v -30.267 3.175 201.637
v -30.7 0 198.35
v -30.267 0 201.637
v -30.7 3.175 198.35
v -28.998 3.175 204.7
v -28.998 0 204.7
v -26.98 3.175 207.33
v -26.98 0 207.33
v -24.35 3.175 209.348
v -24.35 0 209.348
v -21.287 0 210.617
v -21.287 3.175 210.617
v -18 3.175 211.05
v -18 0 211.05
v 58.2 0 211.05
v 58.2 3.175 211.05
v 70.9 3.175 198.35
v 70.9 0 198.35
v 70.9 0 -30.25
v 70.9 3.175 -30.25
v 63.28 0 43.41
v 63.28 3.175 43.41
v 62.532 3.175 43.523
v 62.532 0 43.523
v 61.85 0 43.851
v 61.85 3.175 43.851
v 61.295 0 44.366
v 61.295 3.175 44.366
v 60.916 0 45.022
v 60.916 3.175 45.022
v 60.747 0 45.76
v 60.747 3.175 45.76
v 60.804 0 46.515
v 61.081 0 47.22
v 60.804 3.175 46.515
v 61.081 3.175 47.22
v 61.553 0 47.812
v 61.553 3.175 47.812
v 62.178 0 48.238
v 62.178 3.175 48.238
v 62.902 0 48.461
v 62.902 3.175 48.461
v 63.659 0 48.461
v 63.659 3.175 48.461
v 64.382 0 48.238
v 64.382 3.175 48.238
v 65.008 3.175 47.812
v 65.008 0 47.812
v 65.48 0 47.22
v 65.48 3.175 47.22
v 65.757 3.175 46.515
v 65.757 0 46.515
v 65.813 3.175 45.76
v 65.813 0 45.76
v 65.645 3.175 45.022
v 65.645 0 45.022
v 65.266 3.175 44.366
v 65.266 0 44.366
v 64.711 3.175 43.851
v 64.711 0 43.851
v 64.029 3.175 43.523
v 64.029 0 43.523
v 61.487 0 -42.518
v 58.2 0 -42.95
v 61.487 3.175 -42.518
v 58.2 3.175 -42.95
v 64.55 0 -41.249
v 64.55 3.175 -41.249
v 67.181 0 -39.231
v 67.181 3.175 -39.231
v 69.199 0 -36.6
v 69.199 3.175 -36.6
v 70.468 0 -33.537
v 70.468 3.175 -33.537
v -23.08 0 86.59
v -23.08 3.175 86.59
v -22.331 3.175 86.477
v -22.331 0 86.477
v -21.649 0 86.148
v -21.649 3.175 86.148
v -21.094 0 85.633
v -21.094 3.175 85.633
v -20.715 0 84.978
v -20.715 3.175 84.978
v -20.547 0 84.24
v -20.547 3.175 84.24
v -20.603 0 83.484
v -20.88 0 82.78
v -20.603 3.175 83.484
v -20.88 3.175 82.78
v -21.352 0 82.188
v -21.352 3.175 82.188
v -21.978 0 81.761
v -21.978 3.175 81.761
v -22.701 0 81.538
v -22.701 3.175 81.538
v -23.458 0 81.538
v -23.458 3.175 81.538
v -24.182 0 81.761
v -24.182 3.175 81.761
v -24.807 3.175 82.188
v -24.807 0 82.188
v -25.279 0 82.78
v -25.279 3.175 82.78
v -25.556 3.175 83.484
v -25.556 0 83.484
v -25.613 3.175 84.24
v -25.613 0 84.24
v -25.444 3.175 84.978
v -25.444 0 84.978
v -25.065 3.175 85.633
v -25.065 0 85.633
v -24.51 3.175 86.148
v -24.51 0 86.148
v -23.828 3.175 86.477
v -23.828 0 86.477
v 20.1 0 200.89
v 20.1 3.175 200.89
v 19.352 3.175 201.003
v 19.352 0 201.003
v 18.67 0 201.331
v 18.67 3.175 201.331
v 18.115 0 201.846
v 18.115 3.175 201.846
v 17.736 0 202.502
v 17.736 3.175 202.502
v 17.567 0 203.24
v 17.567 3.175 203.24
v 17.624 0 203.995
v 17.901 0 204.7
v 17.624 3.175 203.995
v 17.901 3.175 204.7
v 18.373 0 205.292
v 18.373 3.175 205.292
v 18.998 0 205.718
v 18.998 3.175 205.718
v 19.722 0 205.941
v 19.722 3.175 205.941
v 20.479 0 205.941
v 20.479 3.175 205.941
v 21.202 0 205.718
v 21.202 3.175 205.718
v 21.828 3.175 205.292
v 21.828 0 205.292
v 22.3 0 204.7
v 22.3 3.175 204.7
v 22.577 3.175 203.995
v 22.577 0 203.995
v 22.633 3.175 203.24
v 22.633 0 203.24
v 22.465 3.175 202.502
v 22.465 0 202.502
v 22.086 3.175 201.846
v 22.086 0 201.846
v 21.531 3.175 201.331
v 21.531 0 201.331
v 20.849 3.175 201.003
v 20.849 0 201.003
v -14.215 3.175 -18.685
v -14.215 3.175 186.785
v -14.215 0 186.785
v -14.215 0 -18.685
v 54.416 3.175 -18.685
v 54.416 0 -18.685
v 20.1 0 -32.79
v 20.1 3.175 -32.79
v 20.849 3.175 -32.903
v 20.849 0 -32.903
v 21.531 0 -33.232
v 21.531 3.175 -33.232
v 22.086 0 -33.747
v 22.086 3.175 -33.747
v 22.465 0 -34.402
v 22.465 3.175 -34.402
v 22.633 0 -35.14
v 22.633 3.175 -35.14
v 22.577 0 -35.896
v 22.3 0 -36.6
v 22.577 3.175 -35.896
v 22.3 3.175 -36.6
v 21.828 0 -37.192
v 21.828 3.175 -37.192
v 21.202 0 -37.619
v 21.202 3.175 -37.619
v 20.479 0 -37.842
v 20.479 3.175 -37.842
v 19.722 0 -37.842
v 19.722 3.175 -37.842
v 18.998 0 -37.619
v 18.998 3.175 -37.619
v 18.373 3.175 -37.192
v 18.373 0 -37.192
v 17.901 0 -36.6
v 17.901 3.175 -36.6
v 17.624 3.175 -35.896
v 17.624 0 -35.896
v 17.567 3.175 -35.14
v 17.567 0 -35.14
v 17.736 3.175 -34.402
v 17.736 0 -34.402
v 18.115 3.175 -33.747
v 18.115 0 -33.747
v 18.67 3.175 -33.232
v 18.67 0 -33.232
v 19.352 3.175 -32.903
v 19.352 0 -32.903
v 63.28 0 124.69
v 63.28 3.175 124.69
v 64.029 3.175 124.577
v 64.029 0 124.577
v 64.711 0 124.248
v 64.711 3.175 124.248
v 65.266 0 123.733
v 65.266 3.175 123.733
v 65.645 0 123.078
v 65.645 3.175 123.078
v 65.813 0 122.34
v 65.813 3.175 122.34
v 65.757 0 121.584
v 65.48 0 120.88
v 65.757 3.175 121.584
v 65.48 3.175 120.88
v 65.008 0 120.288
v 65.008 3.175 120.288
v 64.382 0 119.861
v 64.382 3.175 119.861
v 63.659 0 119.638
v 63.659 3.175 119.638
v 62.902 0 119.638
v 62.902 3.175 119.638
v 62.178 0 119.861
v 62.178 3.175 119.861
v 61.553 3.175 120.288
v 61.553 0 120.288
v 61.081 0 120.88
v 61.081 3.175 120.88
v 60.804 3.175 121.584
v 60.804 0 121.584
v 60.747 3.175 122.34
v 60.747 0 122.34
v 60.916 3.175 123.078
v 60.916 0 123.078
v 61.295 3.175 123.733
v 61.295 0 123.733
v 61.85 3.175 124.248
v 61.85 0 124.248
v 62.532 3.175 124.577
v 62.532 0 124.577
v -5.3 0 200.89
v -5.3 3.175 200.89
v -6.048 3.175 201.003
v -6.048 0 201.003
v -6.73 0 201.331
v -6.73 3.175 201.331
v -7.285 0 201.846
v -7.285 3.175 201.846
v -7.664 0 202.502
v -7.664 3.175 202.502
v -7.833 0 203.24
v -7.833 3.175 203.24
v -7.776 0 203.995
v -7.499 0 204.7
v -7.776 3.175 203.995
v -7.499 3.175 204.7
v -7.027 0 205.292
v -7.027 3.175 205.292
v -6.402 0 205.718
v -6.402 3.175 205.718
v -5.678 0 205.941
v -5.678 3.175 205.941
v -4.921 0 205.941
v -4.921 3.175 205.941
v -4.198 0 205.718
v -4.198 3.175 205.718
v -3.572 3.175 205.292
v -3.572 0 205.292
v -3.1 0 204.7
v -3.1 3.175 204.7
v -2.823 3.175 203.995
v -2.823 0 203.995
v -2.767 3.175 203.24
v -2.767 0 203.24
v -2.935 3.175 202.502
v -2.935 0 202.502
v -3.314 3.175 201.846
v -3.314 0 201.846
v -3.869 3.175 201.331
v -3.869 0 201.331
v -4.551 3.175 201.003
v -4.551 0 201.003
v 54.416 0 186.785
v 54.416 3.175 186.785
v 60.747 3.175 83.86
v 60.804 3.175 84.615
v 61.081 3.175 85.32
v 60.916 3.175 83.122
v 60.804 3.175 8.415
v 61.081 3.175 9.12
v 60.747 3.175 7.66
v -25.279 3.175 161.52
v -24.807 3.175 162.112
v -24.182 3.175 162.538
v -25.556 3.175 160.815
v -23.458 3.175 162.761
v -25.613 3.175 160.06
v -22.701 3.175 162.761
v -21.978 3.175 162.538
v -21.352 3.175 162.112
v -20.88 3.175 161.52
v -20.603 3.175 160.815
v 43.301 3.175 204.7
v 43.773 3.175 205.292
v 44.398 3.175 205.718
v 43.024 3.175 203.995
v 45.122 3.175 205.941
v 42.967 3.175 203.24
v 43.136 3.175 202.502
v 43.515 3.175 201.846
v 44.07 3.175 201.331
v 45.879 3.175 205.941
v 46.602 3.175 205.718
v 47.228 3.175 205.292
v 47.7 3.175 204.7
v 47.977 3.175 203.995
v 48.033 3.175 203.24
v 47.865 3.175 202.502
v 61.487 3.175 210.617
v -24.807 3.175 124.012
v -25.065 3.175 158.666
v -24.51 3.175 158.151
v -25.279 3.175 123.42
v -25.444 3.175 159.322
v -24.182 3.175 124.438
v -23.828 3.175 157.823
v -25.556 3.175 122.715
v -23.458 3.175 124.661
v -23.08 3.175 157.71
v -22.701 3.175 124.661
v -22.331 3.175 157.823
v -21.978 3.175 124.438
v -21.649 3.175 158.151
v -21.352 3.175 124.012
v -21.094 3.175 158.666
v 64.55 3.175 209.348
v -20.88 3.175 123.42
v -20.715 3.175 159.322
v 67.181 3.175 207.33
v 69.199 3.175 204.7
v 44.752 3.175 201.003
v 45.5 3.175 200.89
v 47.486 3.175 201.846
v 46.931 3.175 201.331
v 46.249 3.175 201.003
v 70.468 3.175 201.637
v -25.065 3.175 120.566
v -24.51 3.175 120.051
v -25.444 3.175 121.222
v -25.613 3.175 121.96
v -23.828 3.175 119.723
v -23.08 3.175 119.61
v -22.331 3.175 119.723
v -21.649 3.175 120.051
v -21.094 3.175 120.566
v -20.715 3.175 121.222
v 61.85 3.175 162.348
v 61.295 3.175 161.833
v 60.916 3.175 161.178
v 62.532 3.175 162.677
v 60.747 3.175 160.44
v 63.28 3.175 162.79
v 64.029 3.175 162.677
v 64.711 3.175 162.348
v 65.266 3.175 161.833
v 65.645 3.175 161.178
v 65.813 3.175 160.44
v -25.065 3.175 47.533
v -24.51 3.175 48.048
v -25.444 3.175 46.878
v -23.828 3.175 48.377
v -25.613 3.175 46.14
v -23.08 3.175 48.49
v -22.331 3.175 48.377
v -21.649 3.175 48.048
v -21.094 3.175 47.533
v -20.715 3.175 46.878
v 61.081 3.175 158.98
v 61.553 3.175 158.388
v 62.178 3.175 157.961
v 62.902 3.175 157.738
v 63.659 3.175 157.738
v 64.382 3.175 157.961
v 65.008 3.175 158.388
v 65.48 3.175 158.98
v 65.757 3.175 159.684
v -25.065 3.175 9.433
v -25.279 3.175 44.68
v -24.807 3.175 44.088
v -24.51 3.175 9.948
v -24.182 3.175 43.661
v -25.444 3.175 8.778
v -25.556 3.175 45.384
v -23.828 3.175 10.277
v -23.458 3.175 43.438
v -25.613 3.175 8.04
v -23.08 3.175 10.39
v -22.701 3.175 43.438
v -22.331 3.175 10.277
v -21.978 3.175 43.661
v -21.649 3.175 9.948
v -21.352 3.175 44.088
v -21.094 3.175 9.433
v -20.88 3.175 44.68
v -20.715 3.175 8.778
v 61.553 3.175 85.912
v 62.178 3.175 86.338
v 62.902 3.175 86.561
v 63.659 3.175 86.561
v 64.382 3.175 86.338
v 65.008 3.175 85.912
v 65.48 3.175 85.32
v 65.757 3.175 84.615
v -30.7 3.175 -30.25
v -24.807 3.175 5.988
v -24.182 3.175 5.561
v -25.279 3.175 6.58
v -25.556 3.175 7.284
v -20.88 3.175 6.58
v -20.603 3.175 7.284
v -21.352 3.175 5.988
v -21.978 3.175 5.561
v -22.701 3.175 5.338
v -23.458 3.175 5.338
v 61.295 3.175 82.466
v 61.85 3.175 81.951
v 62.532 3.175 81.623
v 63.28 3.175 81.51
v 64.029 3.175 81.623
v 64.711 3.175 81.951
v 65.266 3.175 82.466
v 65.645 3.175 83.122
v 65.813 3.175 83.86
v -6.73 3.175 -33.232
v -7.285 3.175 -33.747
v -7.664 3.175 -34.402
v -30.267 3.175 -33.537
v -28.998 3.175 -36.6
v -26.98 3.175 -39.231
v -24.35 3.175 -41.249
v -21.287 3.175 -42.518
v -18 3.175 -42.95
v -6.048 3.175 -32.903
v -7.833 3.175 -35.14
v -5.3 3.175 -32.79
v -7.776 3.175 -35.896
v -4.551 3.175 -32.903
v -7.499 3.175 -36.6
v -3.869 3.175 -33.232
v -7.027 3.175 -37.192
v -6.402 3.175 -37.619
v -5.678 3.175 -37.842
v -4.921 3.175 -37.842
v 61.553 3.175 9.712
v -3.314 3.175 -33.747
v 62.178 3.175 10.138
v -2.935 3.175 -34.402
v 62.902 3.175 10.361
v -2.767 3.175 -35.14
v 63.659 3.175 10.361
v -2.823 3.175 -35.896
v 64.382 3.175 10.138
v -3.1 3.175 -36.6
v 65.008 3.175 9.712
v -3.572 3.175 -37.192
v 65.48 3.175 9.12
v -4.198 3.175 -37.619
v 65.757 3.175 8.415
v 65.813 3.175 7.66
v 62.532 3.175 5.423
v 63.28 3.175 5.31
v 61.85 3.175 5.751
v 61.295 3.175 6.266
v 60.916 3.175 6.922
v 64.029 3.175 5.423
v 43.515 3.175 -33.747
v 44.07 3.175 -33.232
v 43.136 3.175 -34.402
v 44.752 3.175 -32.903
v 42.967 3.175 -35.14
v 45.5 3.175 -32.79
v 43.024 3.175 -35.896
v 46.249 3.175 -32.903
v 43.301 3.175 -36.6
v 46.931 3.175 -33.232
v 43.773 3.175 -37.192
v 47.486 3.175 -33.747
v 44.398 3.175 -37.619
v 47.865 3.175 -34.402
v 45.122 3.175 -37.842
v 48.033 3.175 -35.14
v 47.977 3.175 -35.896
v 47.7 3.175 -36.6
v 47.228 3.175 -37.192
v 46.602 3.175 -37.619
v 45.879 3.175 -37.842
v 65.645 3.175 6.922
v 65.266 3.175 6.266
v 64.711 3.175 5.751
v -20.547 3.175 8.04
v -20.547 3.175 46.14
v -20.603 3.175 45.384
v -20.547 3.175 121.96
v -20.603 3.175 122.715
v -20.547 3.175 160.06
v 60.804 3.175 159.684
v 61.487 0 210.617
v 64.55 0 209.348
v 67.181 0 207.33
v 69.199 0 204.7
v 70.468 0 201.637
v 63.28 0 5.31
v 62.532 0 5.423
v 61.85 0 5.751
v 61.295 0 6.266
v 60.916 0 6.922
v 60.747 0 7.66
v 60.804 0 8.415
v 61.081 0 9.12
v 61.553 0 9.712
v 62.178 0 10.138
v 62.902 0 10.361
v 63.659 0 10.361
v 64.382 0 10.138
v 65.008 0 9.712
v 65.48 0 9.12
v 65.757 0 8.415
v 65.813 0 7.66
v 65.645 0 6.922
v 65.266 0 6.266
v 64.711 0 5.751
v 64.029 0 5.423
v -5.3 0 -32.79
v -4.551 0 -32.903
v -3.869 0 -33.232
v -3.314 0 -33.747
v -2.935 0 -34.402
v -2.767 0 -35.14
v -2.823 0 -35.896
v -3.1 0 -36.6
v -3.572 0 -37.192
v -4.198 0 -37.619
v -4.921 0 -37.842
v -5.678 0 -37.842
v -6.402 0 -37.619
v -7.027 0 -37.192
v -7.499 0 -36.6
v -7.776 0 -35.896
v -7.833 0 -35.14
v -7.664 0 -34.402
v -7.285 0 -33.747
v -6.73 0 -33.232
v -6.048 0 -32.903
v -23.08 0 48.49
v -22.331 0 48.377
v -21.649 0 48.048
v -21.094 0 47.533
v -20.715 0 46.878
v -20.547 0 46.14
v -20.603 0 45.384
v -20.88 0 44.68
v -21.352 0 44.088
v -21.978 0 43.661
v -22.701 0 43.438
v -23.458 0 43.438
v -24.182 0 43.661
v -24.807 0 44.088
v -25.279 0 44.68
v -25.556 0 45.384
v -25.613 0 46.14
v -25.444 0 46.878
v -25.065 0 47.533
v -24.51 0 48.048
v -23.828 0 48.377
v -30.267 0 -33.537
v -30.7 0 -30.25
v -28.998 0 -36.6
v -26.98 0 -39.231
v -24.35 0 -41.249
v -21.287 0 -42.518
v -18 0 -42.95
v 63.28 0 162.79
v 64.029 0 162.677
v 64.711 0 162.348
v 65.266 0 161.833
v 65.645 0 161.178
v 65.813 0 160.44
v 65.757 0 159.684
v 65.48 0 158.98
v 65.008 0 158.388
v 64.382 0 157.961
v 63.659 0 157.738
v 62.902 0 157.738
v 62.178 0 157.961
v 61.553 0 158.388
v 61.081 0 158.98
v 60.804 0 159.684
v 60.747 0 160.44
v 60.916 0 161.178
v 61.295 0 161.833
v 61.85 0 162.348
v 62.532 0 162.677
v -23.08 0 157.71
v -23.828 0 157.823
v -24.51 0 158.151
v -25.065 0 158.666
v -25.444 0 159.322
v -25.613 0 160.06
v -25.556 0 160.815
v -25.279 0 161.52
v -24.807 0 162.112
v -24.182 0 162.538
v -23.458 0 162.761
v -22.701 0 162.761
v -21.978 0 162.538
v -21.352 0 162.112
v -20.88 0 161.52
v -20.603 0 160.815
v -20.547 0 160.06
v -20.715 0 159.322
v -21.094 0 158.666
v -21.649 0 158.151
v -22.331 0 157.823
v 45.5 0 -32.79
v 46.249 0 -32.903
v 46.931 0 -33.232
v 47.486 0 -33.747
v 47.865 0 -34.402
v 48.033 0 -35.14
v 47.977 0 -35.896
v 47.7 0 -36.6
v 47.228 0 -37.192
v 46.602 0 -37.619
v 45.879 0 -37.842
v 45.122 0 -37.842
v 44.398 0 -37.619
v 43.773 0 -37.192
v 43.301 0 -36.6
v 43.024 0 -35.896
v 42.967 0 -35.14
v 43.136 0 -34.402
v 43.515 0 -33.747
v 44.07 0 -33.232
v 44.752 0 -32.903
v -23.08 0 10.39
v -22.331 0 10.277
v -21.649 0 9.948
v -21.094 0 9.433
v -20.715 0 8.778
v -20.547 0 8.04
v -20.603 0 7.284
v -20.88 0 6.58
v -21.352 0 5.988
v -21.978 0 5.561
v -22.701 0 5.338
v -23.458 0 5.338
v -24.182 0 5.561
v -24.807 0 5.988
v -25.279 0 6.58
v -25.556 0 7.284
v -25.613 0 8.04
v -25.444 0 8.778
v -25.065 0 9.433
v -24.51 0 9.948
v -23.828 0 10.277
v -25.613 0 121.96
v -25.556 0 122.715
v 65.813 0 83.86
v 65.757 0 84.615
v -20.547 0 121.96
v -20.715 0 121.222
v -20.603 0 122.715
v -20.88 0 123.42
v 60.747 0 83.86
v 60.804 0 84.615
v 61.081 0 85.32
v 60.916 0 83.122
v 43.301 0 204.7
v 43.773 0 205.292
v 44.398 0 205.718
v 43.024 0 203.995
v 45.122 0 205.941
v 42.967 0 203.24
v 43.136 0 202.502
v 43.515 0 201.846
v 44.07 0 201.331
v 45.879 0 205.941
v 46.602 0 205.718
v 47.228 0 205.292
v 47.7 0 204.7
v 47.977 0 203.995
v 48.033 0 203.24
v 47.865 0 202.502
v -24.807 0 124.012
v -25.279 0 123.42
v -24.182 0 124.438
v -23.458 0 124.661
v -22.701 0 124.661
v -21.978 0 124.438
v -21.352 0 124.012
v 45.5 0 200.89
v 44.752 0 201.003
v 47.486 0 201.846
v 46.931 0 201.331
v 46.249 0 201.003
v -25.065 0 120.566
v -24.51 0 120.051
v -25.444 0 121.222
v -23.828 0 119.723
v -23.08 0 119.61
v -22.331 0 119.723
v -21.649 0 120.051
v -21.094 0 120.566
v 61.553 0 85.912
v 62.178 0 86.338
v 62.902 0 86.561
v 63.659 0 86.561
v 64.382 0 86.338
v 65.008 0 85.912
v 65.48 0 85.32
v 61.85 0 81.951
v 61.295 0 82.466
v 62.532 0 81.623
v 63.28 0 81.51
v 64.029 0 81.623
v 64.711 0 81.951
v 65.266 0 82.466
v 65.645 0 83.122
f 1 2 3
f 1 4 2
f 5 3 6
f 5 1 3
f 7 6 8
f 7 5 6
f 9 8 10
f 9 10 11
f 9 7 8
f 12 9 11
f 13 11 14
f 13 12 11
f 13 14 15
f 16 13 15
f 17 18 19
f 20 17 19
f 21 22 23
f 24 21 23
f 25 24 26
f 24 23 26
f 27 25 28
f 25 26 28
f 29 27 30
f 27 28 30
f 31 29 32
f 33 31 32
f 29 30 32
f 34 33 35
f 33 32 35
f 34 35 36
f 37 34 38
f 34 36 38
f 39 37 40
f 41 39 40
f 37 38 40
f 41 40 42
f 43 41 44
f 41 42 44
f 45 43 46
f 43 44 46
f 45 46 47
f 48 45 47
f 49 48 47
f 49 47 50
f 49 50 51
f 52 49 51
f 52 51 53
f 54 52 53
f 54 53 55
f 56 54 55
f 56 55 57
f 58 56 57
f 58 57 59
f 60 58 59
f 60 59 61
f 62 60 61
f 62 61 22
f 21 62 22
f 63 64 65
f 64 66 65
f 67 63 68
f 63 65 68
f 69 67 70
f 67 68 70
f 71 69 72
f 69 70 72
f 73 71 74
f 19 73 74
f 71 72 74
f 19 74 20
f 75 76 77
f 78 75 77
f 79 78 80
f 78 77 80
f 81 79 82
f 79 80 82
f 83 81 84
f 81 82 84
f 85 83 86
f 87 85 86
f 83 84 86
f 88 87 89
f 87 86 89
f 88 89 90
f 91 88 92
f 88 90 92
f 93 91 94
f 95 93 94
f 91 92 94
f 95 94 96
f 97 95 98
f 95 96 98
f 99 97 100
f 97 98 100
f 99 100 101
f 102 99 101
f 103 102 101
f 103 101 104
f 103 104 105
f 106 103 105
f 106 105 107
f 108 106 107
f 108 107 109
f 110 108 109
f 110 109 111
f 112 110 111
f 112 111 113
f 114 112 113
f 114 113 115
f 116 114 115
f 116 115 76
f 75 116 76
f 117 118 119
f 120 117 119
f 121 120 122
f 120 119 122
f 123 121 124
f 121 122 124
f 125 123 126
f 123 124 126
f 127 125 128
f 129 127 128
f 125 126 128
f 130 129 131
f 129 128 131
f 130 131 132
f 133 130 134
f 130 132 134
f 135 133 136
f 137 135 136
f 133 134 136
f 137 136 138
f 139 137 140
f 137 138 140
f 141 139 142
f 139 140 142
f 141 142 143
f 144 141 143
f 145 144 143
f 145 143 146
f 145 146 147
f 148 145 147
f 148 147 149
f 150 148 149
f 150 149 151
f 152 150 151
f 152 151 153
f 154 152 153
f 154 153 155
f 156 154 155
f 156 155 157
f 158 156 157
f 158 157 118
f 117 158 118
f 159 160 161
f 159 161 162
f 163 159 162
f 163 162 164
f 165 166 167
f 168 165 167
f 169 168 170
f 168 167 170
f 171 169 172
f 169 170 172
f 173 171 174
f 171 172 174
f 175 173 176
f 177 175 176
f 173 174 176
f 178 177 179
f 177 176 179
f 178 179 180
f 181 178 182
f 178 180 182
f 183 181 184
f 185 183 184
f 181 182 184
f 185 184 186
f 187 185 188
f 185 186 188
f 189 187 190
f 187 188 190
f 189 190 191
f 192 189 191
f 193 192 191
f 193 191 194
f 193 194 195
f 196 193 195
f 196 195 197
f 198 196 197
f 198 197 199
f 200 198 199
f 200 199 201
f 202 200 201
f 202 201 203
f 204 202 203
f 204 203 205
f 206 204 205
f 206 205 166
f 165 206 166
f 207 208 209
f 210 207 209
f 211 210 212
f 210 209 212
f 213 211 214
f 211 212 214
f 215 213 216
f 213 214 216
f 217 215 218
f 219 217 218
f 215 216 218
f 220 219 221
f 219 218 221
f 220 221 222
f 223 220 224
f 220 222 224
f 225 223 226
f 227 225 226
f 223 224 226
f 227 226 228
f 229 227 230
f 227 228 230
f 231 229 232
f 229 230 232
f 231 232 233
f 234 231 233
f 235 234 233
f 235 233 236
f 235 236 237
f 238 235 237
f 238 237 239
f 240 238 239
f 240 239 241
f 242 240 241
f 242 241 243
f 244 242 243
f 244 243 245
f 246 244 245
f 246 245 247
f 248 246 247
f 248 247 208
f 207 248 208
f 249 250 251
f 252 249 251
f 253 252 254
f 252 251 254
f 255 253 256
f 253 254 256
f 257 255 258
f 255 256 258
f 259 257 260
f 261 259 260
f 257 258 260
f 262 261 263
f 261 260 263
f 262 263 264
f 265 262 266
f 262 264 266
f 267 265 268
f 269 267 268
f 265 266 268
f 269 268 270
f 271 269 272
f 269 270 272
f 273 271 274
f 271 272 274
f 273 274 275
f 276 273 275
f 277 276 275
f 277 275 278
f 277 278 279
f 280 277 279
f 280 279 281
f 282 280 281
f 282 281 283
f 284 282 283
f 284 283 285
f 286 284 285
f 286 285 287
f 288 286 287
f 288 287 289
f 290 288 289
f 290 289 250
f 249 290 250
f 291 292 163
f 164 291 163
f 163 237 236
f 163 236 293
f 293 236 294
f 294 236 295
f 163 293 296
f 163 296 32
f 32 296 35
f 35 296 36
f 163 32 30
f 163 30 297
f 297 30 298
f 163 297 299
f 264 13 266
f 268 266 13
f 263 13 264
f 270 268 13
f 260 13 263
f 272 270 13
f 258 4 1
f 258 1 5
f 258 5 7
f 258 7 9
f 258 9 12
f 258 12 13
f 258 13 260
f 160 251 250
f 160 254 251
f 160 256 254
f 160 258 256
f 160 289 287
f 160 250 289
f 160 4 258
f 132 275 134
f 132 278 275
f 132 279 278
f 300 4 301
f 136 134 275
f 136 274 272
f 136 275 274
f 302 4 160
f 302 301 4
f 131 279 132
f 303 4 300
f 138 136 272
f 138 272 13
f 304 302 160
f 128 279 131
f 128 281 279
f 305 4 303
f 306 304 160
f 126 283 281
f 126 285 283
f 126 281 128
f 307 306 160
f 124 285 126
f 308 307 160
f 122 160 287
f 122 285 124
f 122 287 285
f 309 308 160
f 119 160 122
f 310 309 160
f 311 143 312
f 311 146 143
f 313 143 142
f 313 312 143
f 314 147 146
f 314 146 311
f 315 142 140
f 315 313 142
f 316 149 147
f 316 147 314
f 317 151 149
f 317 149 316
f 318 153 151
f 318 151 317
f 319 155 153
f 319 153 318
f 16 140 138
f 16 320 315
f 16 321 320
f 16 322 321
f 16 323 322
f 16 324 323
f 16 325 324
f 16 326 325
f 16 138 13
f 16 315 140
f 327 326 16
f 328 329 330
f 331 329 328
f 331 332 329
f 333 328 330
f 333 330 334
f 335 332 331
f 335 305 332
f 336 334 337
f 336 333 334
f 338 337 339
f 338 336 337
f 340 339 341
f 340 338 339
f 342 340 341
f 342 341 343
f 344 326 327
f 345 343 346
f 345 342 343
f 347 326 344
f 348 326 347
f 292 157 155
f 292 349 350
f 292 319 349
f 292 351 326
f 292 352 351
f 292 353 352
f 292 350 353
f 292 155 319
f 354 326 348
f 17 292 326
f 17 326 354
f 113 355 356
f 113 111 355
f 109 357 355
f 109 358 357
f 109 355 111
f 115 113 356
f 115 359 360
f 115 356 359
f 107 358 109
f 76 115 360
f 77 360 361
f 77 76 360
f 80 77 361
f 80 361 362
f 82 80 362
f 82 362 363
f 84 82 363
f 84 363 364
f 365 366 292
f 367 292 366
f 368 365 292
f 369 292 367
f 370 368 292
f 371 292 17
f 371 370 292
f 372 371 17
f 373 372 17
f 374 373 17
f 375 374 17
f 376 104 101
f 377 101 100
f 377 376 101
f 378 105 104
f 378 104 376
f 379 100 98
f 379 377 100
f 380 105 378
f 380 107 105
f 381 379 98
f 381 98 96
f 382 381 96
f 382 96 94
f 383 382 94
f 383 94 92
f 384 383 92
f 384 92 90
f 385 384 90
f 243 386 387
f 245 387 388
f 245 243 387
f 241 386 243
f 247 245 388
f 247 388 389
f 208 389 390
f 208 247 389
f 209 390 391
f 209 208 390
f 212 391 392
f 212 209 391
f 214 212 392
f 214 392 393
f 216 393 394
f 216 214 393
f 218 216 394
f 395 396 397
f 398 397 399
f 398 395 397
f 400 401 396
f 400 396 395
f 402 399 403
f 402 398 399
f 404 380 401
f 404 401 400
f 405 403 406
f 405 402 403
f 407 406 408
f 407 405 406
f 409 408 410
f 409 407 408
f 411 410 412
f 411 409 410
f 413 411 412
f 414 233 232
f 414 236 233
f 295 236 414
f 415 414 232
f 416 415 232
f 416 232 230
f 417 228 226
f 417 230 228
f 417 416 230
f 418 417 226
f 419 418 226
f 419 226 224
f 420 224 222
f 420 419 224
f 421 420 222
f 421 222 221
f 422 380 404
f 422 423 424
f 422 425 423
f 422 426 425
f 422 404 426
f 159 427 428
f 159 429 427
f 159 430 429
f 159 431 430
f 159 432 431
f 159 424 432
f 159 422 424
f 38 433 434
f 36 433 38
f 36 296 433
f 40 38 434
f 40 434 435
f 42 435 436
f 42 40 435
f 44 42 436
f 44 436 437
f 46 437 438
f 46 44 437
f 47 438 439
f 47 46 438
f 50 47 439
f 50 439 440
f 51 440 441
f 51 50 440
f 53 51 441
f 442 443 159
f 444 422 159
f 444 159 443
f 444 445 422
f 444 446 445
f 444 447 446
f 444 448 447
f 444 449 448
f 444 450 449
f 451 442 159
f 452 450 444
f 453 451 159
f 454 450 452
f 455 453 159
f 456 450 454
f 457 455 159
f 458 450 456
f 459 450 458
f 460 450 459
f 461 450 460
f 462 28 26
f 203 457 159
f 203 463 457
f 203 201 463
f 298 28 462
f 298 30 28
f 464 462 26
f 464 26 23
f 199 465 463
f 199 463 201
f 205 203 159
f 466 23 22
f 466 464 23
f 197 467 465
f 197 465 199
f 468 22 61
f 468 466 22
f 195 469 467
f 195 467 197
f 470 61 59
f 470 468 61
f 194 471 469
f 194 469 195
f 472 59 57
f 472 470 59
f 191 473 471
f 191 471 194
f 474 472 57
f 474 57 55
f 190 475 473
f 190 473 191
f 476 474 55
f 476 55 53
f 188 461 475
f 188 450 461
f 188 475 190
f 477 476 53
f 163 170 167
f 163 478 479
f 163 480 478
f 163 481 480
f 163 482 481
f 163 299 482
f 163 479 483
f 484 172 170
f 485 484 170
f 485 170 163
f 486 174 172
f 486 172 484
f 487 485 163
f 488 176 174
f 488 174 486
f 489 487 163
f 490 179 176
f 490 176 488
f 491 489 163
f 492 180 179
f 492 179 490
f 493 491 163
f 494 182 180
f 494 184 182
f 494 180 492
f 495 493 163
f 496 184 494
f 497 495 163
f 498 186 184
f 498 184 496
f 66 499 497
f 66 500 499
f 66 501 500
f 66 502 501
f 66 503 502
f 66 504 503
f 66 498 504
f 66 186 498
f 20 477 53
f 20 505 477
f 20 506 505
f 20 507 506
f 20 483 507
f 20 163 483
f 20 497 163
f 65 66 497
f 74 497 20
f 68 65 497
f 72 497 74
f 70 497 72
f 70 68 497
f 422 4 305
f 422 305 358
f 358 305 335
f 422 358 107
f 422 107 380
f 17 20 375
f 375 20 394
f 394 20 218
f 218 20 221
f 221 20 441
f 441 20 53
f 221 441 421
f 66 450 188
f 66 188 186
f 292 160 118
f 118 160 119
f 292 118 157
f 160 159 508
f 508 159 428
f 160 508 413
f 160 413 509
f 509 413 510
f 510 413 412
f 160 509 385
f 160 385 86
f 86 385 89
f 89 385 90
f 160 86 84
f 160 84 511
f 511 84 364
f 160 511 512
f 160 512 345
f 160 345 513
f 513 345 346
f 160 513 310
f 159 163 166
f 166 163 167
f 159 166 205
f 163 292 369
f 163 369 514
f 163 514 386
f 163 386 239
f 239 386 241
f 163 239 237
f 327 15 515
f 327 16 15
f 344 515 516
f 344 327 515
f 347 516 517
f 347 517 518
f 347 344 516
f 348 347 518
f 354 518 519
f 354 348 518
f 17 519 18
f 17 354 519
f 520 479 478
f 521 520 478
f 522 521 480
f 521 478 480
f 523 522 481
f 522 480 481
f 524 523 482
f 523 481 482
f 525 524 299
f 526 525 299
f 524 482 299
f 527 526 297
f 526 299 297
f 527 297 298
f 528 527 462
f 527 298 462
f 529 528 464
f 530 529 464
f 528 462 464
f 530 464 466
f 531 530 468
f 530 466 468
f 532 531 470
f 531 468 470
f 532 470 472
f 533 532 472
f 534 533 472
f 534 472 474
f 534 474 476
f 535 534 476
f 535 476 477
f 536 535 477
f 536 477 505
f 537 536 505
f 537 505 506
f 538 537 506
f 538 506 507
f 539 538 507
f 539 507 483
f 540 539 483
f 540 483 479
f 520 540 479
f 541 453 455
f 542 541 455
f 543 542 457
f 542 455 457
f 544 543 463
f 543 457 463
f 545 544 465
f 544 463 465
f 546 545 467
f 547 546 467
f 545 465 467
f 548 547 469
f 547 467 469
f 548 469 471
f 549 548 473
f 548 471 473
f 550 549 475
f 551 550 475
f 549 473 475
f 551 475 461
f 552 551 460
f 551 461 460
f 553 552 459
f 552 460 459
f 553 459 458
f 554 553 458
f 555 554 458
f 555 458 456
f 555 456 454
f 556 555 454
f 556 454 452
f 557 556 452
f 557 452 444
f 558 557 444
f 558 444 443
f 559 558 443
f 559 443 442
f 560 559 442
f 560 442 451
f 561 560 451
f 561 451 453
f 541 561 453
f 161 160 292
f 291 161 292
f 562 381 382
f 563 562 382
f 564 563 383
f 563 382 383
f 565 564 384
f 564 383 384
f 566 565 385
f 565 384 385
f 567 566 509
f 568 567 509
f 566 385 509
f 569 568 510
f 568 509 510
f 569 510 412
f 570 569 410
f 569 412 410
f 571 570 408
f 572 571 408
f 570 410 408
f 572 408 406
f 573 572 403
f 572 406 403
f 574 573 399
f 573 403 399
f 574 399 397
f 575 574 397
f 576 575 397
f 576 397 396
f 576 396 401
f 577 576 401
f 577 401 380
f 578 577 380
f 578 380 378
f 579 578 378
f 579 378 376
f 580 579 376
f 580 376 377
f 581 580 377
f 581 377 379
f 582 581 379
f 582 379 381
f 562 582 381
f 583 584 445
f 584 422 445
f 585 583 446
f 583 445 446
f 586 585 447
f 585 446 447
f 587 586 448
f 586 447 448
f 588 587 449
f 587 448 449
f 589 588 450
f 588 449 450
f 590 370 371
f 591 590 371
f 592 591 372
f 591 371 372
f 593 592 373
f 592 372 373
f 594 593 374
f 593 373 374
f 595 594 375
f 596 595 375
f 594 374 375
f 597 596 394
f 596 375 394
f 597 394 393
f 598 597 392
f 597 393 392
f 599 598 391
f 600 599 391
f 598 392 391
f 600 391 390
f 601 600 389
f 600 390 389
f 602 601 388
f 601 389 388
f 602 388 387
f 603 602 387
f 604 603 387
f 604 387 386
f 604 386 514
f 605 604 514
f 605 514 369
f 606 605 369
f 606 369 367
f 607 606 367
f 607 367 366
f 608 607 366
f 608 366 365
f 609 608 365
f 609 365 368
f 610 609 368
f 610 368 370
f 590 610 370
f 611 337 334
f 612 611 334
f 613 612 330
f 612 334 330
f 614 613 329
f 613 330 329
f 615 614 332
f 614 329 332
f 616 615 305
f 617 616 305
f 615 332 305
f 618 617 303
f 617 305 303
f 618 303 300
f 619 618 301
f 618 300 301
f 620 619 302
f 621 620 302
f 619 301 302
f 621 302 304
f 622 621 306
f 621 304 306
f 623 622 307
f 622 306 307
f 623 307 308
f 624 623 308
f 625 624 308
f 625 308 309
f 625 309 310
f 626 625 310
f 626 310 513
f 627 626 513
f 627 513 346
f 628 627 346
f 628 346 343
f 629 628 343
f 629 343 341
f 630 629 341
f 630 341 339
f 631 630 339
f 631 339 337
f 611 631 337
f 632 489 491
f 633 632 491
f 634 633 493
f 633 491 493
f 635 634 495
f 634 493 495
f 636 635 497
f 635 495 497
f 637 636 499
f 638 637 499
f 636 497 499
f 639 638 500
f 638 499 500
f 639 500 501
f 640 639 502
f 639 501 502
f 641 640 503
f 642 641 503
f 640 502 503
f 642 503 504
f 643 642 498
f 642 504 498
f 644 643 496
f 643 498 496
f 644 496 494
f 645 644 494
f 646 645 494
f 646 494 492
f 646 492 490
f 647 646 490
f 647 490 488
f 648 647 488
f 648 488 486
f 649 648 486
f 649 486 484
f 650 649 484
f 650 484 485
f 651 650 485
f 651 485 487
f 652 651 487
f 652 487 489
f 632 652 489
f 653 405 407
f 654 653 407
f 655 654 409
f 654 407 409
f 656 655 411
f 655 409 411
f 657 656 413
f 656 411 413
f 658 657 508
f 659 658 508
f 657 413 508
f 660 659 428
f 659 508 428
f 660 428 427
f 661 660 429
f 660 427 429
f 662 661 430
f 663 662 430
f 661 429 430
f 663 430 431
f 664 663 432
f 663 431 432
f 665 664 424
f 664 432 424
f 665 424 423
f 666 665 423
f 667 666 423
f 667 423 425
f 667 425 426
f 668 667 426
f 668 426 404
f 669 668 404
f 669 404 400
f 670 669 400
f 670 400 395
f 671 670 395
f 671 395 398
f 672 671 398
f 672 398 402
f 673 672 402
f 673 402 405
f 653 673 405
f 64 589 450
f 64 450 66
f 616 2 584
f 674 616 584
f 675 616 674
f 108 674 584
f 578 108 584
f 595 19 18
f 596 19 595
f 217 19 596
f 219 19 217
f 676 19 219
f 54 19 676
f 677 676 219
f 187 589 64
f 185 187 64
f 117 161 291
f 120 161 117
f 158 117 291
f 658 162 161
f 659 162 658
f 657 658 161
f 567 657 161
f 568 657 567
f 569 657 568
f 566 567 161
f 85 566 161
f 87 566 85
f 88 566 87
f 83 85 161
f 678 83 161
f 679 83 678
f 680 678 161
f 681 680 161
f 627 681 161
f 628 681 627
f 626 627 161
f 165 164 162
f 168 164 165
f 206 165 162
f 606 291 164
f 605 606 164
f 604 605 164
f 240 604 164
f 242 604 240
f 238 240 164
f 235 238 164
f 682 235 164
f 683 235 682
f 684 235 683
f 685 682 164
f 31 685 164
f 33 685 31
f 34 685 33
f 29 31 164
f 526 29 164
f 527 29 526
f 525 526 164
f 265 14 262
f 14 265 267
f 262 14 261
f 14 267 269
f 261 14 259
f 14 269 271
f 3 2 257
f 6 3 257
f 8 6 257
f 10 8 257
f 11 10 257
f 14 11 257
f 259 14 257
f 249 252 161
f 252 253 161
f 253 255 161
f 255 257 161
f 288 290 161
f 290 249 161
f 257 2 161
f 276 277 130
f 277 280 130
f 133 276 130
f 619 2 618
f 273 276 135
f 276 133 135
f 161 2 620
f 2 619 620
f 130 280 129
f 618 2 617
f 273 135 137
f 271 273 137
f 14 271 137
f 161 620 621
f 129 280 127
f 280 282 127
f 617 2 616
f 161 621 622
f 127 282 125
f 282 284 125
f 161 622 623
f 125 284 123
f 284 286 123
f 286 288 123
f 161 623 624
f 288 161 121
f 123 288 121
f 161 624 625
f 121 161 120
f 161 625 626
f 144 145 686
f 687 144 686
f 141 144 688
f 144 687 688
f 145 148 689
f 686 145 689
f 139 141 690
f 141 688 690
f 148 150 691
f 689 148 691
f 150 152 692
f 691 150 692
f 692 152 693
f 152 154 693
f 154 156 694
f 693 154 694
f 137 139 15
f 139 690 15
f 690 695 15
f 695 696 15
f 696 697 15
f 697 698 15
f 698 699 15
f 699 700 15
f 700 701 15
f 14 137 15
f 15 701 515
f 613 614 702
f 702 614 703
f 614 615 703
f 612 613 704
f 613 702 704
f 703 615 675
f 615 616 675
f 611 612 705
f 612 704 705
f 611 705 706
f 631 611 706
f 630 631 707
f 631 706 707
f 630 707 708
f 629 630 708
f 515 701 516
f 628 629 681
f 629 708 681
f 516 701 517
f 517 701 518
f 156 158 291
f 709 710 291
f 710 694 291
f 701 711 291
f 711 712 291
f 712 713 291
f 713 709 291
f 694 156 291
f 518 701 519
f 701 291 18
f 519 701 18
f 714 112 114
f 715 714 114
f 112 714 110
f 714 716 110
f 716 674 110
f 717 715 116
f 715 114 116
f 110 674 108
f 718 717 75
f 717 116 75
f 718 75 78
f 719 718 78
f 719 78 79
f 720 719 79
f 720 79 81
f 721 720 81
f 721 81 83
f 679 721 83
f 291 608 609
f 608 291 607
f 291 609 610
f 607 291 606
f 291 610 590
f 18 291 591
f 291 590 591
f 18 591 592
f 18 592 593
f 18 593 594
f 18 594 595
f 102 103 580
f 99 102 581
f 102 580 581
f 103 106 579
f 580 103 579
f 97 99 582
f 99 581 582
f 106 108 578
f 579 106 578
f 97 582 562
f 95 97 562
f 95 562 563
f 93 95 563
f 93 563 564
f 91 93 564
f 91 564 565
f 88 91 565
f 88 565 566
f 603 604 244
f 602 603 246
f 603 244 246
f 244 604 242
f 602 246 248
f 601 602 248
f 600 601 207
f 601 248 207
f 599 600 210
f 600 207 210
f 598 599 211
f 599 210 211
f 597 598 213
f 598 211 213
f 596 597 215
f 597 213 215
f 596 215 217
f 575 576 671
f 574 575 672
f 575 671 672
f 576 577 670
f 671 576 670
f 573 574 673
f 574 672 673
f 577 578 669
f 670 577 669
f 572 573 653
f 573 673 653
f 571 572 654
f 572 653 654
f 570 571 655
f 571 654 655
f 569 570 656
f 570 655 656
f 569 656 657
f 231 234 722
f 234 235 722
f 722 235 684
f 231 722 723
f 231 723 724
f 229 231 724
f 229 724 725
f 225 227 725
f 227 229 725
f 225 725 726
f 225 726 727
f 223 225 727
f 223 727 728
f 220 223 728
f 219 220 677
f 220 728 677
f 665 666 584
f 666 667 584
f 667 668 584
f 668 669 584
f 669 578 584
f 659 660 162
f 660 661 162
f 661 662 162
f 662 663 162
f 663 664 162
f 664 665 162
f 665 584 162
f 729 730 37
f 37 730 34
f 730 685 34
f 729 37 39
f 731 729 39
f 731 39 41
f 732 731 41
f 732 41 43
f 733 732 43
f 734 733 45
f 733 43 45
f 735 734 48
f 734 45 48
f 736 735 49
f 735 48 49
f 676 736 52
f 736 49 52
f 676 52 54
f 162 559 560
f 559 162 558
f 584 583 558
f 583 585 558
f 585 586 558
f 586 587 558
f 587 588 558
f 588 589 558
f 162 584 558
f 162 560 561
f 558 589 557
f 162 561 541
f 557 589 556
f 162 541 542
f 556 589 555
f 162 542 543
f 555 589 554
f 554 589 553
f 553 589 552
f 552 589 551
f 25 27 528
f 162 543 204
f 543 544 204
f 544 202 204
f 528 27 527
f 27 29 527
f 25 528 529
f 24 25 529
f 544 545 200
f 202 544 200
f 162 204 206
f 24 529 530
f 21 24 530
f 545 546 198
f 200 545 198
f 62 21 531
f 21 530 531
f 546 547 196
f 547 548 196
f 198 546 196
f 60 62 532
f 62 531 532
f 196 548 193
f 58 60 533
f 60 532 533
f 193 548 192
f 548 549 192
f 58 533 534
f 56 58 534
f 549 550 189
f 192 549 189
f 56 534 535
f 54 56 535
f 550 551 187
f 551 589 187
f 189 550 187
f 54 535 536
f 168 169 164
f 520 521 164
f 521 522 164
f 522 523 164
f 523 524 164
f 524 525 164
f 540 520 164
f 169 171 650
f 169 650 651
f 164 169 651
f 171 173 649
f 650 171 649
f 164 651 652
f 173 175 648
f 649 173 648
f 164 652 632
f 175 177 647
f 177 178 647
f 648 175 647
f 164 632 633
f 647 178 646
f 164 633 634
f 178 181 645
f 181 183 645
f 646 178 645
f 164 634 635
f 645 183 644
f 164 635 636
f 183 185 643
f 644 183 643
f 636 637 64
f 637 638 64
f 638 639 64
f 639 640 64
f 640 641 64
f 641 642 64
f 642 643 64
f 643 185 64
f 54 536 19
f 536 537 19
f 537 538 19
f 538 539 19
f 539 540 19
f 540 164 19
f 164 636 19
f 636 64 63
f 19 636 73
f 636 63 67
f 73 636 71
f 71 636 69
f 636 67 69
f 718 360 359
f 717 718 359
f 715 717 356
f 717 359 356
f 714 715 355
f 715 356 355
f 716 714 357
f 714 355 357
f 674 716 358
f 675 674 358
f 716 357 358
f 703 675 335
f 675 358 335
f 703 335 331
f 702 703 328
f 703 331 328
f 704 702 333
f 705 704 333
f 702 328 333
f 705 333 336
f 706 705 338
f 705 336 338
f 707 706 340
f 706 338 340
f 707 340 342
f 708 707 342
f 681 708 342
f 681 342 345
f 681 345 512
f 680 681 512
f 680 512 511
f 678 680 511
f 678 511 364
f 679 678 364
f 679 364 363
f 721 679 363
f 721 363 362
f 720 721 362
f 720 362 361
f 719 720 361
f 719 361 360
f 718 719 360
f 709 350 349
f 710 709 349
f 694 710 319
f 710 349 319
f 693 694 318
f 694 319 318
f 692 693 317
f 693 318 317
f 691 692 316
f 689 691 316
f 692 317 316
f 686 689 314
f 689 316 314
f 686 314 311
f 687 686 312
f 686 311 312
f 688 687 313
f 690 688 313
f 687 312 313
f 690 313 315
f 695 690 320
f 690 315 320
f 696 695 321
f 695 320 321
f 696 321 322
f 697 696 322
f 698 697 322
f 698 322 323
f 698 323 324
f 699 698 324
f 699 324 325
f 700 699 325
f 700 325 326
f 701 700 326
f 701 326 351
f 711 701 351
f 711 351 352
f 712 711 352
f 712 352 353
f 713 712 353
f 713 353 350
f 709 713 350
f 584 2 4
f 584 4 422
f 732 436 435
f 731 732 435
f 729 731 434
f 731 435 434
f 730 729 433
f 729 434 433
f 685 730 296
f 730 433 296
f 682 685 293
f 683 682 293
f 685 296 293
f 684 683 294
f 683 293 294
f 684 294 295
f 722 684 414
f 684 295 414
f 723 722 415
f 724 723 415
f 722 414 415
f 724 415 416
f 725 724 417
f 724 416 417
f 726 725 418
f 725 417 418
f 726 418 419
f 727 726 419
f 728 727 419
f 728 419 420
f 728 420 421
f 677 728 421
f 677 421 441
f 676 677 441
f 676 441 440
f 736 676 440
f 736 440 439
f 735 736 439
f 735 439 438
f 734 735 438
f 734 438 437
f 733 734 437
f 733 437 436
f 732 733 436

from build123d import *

# Parameters (mm, degrees)
SKETCH1_W           = 101.6
SKETCH1_H           = 254
BOSS_EXTRUDE1_DEPTH = 3.175
SKETCH2_R           = 2.54
CUT_EXTRUDE1_DEPTH  = 223.663234681
FILLET1_R           = 12.7
SKETCH4_W           = 68.631417281
SKETCH4_H           = 205.47036429
CUT_EXTRUDE2_DEPTH  = 223.663234681


with BuildPart() as part:
    # Sketch1 → Boss-Extrude1 (new body)
    with BuildSketch(Plane(origin=(0, 0, 0), x_dir=(1, 0, 0), z_dir=(0, 1, 0))):
        with Locations((20.100372359, -84.049692378)):
            Rectangle(SKETCH1_W, SKETCH1_H)
    extrude(amount=BOSS_EXTRUDE1_DEPTH)

    # Sketch2 → Cut-Extrude1 (cut, through all)
    with BuildSketch(Plane(origin=(0, 3.175, 0), x_dir=(1, 0, 0), z_dir=(0, 1, 0))):
        with Locations((-5.299627641, 35.330307622)):
            Circle(SKETCH2_R)
        with Locations((20.100372359, 35.330307622)):
            Circle(SKETCH2_R)
        with Locations((45.500372359, 35.330307622)):
            Circle(SKETCH2_R)
        with Locations((-23.079627641, -84.049692378)):
            Circle(SKETCH2_R)
        with Locations((-23.079627641, -45.949692378)):
            Circle(SKETCH2_R)
        with Locations((-23.079627641, -7.849692378)):
            Circle(SKETCH2_R)
        with Locations((63.280372359, -7.849692378)):
            Circle(SKETCH2_R)
        with Locations((63.280372359, -45.949692378)):
            Circle(SKETCH2_R)
        with Locations((63.280372359, -84.049692378)):
            Circle(SKETCH2_R)
        with Locations((63.280372359, -122.149692378)):
            Circle(SKETCH2_R)
        with Locations((63.280372359, -160.249692378)):
            Circle(SKETCH2_R)
        with Locations((-23.079627641, -160.249692378)):
            Circle(SKETCH2_R)
        with Locations((-23.079627641, -122.149692378)):
            Circle(SKETCH2_R)
        with Locations((45.500372359, -203.429692378)):
            Circle(SKETCH2_R)
        with Locations((20.100372359, -203.429692378)):
            Circle(SKETCH2_R)
        with Locations((-5.299627641, -203.429692378)):
            Circle(SKETCH2_R)
    extrude(amount=-CUT_EXTRUDE1_DEPTH, mode=Mode.SUBTRACT)

    # Fillet1
    fillet1_edges = [part.edges().sort_by_distance(p)[0] for p in [
        (-30.699627641, 1.5875, 211.049692378),
        (70.900372359, 1.5875, 211.049692378),
        (70.900372359, 1.5875, -42.950307622),
        (-30.699627641, 1.5875, -42.950307622),
    ]]
    fillet(fillet1_edges, radius=FILLET1_R)

    # Sketch4 → Cut-Extrude2 (cut, through all)
    with BuildSketch(Plane(origin=(0, 3.175, 0), x_dir=(1, 0, 0), z_dir=(0, 1, 0))):
        with Locations((20.100372358, -84.049692378)):
            Rectangle(SKETCH4_W, SKETCH4_H)
    extrude(amount=-CUT_EXTRUDE2_DEPTH, mode=Mode.SUBTRACT)


solid = part.part
